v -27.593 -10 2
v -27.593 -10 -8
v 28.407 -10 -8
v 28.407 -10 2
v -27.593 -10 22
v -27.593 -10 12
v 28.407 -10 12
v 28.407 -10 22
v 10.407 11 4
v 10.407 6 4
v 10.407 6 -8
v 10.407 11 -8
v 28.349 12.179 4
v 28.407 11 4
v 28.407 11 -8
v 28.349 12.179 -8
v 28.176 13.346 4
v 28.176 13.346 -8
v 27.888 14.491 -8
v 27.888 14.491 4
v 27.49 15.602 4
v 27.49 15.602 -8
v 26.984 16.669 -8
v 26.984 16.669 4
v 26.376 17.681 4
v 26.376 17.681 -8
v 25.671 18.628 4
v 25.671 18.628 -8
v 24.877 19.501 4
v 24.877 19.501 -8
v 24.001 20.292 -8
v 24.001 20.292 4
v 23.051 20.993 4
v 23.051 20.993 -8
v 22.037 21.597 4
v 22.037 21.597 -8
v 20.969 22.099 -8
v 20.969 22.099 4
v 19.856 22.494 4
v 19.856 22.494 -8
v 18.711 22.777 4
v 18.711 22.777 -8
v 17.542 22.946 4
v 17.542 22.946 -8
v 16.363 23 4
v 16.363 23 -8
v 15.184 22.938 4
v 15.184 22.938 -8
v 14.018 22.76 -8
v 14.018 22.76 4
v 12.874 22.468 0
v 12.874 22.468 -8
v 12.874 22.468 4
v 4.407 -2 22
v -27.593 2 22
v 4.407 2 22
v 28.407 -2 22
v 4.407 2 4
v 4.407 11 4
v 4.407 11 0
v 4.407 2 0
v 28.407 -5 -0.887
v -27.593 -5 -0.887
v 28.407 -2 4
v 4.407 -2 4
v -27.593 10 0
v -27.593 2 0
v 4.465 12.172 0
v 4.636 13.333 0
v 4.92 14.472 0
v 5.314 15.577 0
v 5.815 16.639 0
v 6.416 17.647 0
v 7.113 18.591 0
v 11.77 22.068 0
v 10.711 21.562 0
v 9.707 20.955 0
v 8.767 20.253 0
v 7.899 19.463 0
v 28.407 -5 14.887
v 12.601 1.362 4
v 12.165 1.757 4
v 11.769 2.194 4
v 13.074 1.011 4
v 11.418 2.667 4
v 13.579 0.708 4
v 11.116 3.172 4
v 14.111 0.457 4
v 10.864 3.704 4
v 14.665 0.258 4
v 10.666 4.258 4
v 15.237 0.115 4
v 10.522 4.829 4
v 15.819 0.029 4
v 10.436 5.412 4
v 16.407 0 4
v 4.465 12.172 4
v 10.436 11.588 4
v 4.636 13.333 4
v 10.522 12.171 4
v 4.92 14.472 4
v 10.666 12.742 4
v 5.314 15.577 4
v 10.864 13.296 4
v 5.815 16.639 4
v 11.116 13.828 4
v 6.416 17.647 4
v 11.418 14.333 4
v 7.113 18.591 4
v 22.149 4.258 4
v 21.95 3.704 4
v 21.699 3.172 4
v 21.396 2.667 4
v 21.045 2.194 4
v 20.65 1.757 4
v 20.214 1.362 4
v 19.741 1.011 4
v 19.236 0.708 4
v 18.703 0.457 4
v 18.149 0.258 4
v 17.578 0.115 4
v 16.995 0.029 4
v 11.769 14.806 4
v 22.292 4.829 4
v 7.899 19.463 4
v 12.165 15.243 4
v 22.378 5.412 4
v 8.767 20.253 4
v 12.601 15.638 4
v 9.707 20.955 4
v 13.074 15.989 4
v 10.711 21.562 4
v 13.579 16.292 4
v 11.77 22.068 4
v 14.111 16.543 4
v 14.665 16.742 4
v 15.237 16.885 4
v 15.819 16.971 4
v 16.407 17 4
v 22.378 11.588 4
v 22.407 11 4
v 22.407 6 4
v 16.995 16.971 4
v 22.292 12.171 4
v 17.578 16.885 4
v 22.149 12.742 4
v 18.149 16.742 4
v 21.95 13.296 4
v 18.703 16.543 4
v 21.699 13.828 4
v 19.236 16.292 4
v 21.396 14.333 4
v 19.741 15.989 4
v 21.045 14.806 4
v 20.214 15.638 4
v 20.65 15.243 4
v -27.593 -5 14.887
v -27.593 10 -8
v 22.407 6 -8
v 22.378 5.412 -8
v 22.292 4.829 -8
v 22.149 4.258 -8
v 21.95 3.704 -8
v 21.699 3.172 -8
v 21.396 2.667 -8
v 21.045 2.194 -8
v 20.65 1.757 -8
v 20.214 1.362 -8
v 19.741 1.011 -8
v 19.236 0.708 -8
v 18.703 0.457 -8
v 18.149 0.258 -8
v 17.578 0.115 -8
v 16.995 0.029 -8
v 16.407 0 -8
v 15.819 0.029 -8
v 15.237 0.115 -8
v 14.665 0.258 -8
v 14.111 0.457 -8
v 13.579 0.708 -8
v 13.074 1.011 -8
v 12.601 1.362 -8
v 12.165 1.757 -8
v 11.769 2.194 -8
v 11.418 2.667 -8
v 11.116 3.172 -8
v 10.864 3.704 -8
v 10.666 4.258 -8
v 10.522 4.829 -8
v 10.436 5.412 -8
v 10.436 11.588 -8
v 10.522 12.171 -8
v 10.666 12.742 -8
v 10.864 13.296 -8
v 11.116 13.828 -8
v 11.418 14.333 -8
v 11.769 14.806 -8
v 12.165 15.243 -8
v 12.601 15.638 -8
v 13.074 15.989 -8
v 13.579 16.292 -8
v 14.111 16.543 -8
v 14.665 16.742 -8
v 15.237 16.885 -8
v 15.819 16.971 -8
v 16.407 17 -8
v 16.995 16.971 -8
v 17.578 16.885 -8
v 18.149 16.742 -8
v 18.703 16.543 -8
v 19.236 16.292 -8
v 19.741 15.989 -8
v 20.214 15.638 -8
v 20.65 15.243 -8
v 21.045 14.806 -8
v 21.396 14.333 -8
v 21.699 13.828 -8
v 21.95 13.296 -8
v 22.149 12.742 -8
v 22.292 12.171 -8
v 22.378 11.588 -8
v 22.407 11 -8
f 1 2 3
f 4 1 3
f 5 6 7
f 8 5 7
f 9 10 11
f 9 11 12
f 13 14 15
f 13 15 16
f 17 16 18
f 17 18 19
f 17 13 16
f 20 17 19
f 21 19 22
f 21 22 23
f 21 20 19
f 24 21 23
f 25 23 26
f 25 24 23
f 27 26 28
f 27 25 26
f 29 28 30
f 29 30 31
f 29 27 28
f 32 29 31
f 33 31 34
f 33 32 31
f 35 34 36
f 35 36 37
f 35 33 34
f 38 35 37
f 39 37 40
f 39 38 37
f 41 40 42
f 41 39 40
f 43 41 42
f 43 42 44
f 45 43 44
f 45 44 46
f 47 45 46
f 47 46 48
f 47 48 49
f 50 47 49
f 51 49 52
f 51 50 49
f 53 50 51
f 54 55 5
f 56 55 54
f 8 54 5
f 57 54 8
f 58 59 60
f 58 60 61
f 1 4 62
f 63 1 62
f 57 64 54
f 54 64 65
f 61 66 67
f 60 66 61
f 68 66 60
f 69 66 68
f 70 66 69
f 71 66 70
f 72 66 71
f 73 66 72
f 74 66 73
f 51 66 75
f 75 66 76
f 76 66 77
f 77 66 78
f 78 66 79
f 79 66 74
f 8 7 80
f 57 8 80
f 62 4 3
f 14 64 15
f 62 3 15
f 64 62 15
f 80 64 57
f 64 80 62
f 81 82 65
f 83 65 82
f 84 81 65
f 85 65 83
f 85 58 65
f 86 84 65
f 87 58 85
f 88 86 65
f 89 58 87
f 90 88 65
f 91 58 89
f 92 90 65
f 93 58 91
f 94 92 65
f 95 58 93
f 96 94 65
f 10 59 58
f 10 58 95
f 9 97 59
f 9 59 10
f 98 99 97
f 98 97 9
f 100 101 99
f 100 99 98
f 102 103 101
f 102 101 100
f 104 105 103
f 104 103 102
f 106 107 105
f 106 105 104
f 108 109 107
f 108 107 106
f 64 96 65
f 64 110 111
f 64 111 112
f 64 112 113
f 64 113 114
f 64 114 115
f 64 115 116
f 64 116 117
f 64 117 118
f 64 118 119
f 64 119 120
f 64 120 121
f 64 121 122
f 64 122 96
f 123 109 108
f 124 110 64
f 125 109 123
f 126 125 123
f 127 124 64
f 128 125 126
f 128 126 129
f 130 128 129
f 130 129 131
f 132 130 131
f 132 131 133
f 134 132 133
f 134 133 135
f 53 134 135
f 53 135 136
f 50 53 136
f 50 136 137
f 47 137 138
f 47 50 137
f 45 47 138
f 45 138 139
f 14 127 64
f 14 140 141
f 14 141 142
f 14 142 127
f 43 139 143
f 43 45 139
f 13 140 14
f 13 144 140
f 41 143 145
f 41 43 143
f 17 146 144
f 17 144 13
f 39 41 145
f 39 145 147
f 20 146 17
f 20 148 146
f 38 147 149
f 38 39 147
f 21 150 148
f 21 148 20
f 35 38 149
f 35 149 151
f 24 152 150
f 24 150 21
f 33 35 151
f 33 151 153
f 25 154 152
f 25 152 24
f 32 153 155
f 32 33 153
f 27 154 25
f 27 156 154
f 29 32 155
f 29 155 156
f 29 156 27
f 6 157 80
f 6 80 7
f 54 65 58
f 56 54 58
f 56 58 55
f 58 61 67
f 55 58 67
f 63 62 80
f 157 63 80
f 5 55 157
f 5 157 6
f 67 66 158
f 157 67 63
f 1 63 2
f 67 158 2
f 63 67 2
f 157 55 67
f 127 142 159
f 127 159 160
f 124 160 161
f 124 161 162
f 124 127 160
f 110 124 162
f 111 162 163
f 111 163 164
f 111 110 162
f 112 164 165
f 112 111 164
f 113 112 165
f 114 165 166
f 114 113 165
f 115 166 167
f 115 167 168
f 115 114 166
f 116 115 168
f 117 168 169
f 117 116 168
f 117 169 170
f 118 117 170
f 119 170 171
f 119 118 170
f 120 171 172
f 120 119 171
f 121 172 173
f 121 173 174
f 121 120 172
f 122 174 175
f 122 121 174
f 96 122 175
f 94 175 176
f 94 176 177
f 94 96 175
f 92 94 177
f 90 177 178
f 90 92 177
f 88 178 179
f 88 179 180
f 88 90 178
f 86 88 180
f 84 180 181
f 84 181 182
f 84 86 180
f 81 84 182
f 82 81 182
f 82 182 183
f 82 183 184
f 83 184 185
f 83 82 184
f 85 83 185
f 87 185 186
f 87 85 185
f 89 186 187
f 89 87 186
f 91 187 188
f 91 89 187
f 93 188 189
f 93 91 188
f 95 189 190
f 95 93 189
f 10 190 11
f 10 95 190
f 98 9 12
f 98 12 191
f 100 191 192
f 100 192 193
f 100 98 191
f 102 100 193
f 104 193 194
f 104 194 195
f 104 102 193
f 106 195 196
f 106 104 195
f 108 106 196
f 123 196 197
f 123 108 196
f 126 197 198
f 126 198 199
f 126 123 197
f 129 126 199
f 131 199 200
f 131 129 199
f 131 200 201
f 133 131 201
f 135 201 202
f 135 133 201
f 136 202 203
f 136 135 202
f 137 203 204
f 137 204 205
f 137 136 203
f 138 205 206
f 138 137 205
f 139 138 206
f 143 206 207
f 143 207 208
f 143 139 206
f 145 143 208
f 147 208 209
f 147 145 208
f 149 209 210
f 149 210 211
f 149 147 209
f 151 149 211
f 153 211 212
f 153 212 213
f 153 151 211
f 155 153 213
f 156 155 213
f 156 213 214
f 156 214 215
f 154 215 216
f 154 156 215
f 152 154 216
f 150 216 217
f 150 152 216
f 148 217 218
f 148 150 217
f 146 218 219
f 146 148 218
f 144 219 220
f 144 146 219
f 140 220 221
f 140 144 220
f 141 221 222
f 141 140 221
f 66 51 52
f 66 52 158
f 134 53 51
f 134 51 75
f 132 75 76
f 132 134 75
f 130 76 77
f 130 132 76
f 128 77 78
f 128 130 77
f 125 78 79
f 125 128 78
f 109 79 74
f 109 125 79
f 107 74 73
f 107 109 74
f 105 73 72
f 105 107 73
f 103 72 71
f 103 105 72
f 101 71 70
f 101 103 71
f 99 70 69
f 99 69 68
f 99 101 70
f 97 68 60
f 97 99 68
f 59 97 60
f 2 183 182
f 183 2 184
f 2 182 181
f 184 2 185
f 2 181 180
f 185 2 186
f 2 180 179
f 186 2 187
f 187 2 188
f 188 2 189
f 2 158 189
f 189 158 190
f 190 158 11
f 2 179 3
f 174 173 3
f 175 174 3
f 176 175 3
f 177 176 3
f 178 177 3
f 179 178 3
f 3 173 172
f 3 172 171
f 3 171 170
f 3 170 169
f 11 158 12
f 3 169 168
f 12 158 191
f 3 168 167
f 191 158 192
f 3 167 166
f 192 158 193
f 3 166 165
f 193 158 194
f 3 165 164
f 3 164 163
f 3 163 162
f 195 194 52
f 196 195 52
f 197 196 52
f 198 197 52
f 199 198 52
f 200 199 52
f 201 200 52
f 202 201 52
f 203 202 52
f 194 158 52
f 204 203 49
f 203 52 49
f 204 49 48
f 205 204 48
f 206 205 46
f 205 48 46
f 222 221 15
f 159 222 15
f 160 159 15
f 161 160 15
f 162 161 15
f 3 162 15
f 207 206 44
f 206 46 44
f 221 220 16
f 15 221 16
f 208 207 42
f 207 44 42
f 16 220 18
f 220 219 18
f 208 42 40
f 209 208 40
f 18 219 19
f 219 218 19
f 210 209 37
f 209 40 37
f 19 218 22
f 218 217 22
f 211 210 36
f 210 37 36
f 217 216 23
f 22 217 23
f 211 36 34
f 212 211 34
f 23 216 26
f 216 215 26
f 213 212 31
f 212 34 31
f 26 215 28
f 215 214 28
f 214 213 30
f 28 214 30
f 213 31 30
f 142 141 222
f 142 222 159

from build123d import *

# Parameters (mm, degrees)
EXTRUDE_1_DEPTH          = 8
EXTRUDE_START            = 4
EXTRUDE_2_DEPTH          = 4
EXTRUDE_3_DEPTH          = 22
CUT_EXTRUDE_1_DEPTH      = 65.412731661
CUT_EXTRUDE_1_DEPTH_BACK = 65.412731661


with BuildPart() as part:
    # 草图1 → 凸台-拉伸1 (new body)
    with BuildSketch(Plane.XY):
        with BuildLine():
            Line((-27.592823234, -10), (28.407176766, -10))
            Line((28.407176766, -10), (28.407176766, 11))
            ThreePointArc((28.407176766, 11), (23.534575752, 20.654024223), (12.873812817, 22.468013743))
            Line((12.873812817, 22.468013743), (-27.592823234, 10))
            Line((-27.592823234, 10), (-27.592823234, -10))
        make_face()
        with BuildLine():
            ThreePointArc((22.407176766, 6), (16.407176766, 0), (10.407176766, 6))
            Line((10.407176766, 6), (10.407176766, 11))
            ThreePointArc((10.407176766, 11), (16.407176766, 17), (22.407176766, 11))
            Line((22.407176766, 11), (22.407176766, 6))
        make_face(mode=Mode.SUBTRACT)
    extrude(amount=-EXTRUDE_1_DEPTH)

    # 草图1<3> → 凸台-拉伸2 (add)
    with BuildSketch(Plane.XY.offset(EXTRUDE_START)):
        with BuildLine():
            Line((4.407176766, -2), (28.407176766, -2))
            Line((28.407176766, -2), (28.407176766, 11))
            ThreePointArc((28.407176766, 11), (23.534575752, 20.654024223), (12.873812817, 22.468013743))
            ThreePointArc((12.873812817, 22.468013743), (6.753152543, 18.127398986), (4.407176766, 11))
            Line((4.407176766, 11), (4.407176766, 2))
            Line((4.407176766, 2), (4.407176766, -2))
        make_face()
        with BuildLine():
            ThreePointArc((10.407176766, 11), (16.407176766, 17), (22.407176766, 11))
            Line((22.407176766, 11), (22.407176766, 6))
            ThreePointArc((22.407176766, 6), (16.407176766, 0), (10.407176766, 6))
            Line((10.407176766, 6), (10.407176766, 11))
        make_face(mode=Mode.SUBTRACT)
    extrude(amount=-EXTRUDE_2_DEPTH)

    # 草图1<4> → 凸台-拉伸3 (add)
    with BuildSketch(Plane.XY):
        Polygon((-27.592823234, -10), (28.407176766, -10), (28.407176766, -2), (4.407176766, -2), (4.407176766, 2), (-27.592823234, 2), align=None)
    extrude(amount=EXTRUDE_3_DEPTH)

    # 草图3 → 切除-拉伸1 (cut, two sides: drawn at the far end of the back side and taken through both)
    with BuildSketch(Plane.ZY.offset(27.592823234).offset(-CUT_EXTRUDE_1_DEPTH_BACK)):
        Polygon((2, -10), (-0.886751346, -5), (14.886751346, -5), (12, -10), align=None)
    extrude(amount=CUT_EXTRUDE_1_DEPTH + CUT_EXTRUDE_1_DEPTH_BACK, mode=Mode.SUBTRACT)


solid = part.part
